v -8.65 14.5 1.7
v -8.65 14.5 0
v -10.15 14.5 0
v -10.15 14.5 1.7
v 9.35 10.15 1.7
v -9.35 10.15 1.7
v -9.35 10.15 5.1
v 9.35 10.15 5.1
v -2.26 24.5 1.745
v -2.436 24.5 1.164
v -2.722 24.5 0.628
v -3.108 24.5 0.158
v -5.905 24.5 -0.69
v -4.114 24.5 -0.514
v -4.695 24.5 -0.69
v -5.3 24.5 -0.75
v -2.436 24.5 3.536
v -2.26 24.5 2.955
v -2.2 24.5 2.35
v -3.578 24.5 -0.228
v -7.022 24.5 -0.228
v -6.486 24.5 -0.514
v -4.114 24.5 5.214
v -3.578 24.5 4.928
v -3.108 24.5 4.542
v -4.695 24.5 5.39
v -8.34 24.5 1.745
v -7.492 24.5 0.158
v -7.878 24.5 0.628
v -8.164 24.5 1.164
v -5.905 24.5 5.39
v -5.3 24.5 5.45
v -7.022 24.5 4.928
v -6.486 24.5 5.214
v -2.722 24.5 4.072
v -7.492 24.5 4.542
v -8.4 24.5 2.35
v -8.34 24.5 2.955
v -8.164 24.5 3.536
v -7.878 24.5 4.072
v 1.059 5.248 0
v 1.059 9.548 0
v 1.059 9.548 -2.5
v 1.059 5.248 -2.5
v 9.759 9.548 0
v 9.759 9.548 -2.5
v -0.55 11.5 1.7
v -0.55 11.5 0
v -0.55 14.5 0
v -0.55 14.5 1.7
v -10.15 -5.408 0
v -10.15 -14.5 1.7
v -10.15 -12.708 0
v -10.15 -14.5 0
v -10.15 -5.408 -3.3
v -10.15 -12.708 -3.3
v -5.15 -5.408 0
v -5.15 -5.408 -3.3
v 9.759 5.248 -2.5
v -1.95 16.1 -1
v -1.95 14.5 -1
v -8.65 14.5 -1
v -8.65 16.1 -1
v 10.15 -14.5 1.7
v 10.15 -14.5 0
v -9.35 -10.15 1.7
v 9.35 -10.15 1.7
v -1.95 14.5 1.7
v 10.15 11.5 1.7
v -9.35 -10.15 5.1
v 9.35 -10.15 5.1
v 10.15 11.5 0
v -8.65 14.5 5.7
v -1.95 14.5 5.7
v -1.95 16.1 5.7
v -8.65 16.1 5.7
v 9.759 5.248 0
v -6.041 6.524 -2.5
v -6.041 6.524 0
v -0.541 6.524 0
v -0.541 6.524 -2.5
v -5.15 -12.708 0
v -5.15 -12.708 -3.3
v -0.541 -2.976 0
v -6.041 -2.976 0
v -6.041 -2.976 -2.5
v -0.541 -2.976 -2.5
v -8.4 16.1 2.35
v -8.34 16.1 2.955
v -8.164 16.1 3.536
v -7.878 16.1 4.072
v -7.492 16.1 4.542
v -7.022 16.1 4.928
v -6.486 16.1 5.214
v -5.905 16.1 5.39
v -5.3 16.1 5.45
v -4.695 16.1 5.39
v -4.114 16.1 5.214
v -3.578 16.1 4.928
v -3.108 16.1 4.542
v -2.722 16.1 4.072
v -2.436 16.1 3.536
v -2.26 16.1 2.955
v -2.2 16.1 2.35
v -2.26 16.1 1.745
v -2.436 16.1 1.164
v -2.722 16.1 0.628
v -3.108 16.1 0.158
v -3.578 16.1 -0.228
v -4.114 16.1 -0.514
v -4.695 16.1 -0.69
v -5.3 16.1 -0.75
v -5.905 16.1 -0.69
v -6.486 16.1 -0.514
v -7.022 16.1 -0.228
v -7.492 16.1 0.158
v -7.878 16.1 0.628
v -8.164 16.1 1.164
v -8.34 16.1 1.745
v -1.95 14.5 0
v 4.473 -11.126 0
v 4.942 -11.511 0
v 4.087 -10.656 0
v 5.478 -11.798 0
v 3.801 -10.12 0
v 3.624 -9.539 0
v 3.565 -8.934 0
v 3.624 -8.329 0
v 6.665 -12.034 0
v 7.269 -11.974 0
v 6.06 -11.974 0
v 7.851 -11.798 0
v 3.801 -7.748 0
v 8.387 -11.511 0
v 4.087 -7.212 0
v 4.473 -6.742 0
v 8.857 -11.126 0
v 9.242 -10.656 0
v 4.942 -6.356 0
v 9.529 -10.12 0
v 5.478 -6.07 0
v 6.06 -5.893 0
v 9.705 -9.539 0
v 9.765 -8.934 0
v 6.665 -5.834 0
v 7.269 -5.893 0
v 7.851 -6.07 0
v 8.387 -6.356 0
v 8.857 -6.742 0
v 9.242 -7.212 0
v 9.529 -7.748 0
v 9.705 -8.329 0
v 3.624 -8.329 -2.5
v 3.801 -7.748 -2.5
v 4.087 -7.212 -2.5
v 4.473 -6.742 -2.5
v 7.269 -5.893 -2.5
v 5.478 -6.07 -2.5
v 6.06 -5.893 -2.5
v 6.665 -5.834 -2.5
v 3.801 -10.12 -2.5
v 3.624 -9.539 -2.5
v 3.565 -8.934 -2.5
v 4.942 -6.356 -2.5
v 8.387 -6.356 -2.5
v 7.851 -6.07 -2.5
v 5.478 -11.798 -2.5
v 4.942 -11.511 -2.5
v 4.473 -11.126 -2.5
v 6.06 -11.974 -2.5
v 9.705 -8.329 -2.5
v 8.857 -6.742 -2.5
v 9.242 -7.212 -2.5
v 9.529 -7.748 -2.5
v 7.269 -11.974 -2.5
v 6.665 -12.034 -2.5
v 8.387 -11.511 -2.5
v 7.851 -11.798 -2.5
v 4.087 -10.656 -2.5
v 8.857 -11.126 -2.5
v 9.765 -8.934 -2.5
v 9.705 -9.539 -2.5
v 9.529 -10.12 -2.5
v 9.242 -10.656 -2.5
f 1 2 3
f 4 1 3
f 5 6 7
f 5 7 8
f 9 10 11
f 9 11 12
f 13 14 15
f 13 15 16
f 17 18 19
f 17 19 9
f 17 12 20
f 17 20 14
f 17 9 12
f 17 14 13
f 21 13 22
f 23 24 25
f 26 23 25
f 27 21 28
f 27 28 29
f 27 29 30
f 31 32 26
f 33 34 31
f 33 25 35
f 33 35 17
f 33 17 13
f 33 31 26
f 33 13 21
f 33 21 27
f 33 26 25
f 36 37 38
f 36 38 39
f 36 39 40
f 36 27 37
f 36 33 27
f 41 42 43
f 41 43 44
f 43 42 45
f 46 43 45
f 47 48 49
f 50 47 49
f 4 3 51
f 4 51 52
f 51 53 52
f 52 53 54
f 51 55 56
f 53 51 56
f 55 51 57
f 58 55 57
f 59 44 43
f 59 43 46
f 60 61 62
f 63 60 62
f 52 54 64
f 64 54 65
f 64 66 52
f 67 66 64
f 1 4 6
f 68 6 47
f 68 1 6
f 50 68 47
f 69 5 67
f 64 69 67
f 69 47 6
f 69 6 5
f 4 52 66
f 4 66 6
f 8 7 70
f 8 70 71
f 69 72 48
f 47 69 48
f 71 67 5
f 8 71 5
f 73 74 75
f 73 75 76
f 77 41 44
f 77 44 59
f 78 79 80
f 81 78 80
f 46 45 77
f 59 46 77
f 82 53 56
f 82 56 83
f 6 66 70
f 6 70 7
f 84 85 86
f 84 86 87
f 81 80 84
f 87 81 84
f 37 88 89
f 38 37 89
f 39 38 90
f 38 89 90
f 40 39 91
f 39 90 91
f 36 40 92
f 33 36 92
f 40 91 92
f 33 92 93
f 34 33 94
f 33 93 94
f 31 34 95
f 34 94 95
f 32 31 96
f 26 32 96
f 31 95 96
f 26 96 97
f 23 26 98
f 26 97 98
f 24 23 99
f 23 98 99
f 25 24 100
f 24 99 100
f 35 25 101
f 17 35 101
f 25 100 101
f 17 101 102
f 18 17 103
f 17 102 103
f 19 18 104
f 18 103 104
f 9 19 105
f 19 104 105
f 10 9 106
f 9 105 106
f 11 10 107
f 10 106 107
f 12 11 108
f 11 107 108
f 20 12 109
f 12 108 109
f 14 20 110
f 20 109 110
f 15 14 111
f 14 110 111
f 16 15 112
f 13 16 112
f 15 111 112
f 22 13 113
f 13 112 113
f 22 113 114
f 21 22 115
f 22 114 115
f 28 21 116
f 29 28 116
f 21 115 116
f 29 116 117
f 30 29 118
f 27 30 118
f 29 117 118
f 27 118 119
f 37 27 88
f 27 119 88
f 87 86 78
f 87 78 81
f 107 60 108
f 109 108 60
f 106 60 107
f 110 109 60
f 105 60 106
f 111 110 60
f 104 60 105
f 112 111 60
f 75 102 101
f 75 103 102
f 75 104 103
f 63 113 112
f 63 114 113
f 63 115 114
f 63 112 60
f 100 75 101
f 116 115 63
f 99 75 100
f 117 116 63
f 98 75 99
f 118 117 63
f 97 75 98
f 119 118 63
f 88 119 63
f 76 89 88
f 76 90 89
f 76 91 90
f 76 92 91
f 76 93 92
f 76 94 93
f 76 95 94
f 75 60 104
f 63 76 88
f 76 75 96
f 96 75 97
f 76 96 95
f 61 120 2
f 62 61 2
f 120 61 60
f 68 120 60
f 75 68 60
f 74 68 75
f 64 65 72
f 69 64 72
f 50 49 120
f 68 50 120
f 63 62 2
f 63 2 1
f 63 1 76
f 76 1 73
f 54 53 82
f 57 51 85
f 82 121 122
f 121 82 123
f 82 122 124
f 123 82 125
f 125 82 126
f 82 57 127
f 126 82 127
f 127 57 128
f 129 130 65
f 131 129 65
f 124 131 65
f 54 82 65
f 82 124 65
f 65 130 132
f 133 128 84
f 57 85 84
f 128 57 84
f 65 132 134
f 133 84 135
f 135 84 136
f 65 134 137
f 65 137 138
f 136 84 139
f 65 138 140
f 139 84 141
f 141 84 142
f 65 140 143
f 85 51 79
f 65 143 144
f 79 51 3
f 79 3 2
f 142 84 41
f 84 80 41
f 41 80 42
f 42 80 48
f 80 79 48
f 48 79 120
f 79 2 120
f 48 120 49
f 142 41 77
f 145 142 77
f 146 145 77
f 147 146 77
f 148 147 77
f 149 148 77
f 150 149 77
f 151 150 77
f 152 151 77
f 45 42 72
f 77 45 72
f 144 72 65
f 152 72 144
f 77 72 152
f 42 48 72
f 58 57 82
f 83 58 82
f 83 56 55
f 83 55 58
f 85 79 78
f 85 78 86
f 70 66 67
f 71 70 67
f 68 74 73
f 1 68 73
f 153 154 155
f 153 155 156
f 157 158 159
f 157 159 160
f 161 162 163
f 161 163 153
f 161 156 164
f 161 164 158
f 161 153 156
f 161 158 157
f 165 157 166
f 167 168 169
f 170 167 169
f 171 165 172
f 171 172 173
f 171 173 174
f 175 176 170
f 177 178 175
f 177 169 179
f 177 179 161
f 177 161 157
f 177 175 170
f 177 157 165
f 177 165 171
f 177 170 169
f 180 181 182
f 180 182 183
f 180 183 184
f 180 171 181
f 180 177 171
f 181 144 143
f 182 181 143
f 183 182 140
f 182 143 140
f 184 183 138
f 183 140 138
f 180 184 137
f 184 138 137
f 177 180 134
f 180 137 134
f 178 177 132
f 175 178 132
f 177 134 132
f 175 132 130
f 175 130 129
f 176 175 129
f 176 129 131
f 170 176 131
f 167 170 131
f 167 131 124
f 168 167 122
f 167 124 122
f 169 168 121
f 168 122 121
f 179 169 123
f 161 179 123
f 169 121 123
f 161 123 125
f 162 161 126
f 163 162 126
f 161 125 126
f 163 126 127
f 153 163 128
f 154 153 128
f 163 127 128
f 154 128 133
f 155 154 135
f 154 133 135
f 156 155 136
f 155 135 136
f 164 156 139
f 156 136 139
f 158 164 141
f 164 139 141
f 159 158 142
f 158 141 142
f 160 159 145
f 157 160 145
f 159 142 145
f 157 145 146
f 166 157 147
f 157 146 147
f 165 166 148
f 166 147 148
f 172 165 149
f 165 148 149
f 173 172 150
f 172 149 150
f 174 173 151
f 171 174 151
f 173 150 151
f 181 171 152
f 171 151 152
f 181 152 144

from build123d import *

# Parameters (mm, degrees)
F1_DEPTH  = 1.7
F2_W      = 18.7
F2_H      = 20.3
F3_DEPTH  = 3.4
F4_W      = 5
F4_H      = 7.3
F5_DEPTH  = 3.3
F4_W_2    = 5.5
F4_H_2    = 9.5
F4_W_3    = 8.7
F4_H_3    = 4.3
F4_R      = 3.1
F6_DEPTH  = 2.5
F7_W      = 6.7
F7_H      = 6.7
F8_DEPTH  = 1.6
F9_R      = 3.1
F10_DEPTH = 8.4


with BuildPart() as f1:
    # F0 (on Top) → F1 (new body)
    with BuildSketch(Plane.XY):
        Polygon((-10.15, -14.5), (10.15, -14.5), (10.15, 11.5), (-0.55, 11.5), (-0.55, 14.5), (-10.15, 14.5), align=None)
    extrude(amount=F1_DEPTH)

    # F2 (on face) → F3 (join)
    with BuildSketch(Plane.XY.offset(1.7)):
        Rectangle(F2_W, F2_H)
    extrude(amount=F3_DEPTH)

    # F4 (on face) → F5 (join)
    with BuildSketch(Plane(origin=(0, 0, 0), x_dir=(1, 0, 0), z_dir=(0, 0, -1))):
        with Locations((-7.65, 9.057866)):
            Rectangle(F4_W, F4_H)
    extrude(amount=F5_DEPTH)

    # F4 (on face) → F6 (join)
    with BuildSketch(Plane(origin=(0, 0, 0), x_dir=(1, 0, 0), z_dir=(0, 0, -1))):
        with Locations((-3.290825, -1.773557)):
            Rectangle(F4_W_2, F4_H_2)
        with Locations((5.408567, -7.397804)):
            Rectangle(F4_W_3, F4_H_3)
        with Locations((6.664579, 8.933897)):
            Circle(F4_R)
    extrude(amount=F6_DEPTH)

    # F7 (on face) → F8 (join)
    with BuildSketch(Plane(origin=(0, 14.5, 0), x_dir=(-1, 0, 0), z_dir=(0, 1, 0))):
        with Locations((5.3, 2.35)):
            Rectangle(F7_W, F7_H)
    extrude(amount=F8_DEPTH)

    # F9 (on face) → F10 (join)
    with BuildSketch(Plane(origin=(0, 16.1, 0), x_dir=(-1, 0, 0), z_dir=(0, 1, 0))):
        with Locations((5.3, 2.35)):
            Circle(F9_R)
    extrude(amount=F10_DEPTH)


solid = f1.part
